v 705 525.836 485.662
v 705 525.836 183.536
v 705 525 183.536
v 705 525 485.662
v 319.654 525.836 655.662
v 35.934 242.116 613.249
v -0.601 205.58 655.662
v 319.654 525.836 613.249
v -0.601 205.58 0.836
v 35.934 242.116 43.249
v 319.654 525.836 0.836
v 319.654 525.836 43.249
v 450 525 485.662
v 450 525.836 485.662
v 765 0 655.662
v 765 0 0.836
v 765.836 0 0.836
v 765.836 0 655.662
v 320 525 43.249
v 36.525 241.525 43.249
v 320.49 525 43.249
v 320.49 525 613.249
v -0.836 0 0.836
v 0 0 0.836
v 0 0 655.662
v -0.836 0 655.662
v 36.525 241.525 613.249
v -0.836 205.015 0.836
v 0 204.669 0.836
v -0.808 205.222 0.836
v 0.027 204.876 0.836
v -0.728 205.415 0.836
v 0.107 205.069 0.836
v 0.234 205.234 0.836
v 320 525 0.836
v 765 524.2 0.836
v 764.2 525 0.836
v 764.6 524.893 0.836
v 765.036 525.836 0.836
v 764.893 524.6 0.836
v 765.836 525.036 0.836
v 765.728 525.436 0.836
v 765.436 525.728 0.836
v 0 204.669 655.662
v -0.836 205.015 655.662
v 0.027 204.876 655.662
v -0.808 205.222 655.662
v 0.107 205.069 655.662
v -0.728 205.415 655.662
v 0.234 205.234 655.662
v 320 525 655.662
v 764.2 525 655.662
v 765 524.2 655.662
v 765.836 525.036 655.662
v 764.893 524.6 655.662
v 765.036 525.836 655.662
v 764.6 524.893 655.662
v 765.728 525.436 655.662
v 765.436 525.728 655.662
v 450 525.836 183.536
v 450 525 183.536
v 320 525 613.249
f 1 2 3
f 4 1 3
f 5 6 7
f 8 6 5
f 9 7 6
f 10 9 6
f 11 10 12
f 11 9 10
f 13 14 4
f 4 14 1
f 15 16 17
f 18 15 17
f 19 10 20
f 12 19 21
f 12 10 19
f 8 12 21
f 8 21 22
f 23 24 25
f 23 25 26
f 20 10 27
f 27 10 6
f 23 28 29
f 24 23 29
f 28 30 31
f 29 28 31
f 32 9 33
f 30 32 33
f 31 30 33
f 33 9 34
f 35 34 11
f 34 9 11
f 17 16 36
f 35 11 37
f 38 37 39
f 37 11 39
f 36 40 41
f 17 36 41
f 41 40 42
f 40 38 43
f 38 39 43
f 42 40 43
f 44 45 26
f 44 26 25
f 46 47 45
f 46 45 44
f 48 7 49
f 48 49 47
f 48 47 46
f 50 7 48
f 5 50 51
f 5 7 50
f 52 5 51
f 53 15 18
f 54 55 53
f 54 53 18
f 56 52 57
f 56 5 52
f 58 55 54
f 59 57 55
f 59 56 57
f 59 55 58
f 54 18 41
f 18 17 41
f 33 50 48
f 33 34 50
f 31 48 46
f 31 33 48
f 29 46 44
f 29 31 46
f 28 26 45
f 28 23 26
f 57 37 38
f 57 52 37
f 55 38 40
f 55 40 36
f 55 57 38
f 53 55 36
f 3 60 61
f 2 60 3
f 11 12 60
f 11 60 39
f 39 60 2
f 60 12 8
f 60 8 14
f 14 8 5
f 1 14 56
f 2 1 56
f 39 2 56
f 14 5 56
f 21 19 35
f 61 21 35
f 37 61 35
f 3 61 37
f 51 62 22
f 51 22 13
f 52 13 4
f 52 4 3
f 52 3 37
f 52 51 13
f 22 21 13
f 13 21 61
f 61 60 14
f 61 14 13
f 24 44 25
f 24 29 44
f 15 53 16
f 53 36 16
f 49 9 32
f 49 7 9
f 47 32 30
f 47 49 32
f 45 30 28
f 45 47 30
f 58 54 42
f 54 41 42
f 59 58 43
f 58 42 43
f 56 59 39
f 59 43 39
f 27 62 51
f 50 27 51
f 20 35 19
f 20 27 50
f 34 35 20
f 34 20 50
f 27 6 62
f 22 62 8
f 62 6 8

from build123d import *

# Parameters (mm, degrees)
SALIENTE_EXTRUIR1_DEPTH    = 0.83566
SALIENTE_EXTRUIR2_DEPTH    = 12.7
SALIENTE_EXTRUIR3_DEPTH    = 642.126
CROQUIS4_W                 = 255
CROQUIS4_H                 = 0.83566
SALIENTE_EXTRUIR4_DEPTH    = 170
CROQUIS5_W                 = 255
CROQUIS5_H                 = 0.83566
SALIENTE_EXTRUIR5_DEPTH    = 170
CROQUIS6_W                 = 570
CROQUIS6_H                 = 401.24062337
CORTAR_EXTRUIR1_DEPTH      = 190
CORTAR_EXTRUIR2_DEPTH      = 198
CORTAR_EXTRUIR2_DEPTH_BACK = 174
REDONDEO3_R                = 0.8


with BuildPart() as part:
    # Croquis1 → Saliente-Extruir1 (new body)
    with BuildSketch(Plane.XY):
        Polygon((0, 0), (765, 0), (765, 525), (320, 525), (0, 205), align=None)
    extrude(amount=SALIENTE_EXTRUIR1_DEPTH)

    # Croquis7 → Cortar-Extruir2 (cut, two sides: drawn at the far end of the back side and taken through both)
    with BuildSketch(Plane.XY.offset(0.83566).offset(-CORTAR_EXTRUIR2_DEPTH_BACK)):
        Polygon((0, 0), (765, 0), (765, 525), (320, 525), (0, 205), align=None)
    extrude(amount=CORTAR_EXTRUIR2_DEPTH + CORTAR_EXTRUIR2_DEPTH_BACK, mode=Mode.SUBTRACT)


with BuildPart() as body_2:
    # Croquis2 → Saliente-Extruir2 (new body)
    with BuildSketch(Plane.XY.offset(0.83566)):
        Polygon((765.83566, 525.83566), (319.653858294, 525.83566), (-0.83566, 205.346141706), (-0.83566, 0), (0, 0), (0, 205), (320, 525), (765, 525), (765, 0), (765.83566, 0), align=None)
    extrude(amount=SALIENTE_EXTRUIR2_DEPTH)

    # Croquis3 → Saliente-Extruir3 (add)
    with BuildSketch(Plane.XY.offset(13.53566)):
        Polygon((450, 525.83566), (450, 525), (320, 525), (0, 205), (0, 0), (-0.83566, 0), (-0.83566, 205.346141706), (319.653858294, 525.83566), align=None)
        Polygon((765.83566, 0), (765.83566, 525.83566), (705, 525.83566), (705, 525), (765, 525), (765, 0), align=None)
    extrude(amount=SALIENTE_EXTRUIR3_DEPTH)

    # Croquis4 → Saliente-Extruir4 (add)
    with BuildSketch(Plane.XY.offset(13.53566)):
        with Locations((577.5, 525.41783)):
            Rectangle(CROQUIS4_W, CROQUIS4_H)
    extrude(amount=SALIENTE_EXTRUIR4_DEPTH)

    # Croquis5 → Saliente-Extruir5 (add)
    with BuildSketch(Plane.XY.offset(655.66166)):
        with Locations((577.5, 525.41783)):
            Rectangle(CROQUIS5_W, CROQUIS5_H)
    extrude(amount=-SALIENTE_EXTRUIR5_DEPTH)

    # Croquis6 → Cortar-Extruir1 (cut)
    with BuildSketch(Plane(origin=(-103.090900853, 103.090900853, 0), x_dir=(0, 0, 1), z_dir=(-0.7071067811865477, 0.7071067811865475, 0))):
        with Locations((328.24866, 397.231060123)):
            Rectangle(CROQUIS6_W, CROQUIS6_H)
    extrude(amount=-CORTAR_EXTRUIR1_DEPTH, mode=Mode.SUBTRACT)

    # Redondeo3
    redondeo3_edges = [body_2.edges().sort_by_distance(p)[0] for p in [
        (0, 205, 328.24866),
        (-0.83566, 205.346141706, 328.24866),
        (765.83566, 525.83566, 328.24866),
        (765, 525, 328.24866),
    ]]
    fillet(redondeo3_edges, radius=REDONDEO3_R)


solid = body_2.part
